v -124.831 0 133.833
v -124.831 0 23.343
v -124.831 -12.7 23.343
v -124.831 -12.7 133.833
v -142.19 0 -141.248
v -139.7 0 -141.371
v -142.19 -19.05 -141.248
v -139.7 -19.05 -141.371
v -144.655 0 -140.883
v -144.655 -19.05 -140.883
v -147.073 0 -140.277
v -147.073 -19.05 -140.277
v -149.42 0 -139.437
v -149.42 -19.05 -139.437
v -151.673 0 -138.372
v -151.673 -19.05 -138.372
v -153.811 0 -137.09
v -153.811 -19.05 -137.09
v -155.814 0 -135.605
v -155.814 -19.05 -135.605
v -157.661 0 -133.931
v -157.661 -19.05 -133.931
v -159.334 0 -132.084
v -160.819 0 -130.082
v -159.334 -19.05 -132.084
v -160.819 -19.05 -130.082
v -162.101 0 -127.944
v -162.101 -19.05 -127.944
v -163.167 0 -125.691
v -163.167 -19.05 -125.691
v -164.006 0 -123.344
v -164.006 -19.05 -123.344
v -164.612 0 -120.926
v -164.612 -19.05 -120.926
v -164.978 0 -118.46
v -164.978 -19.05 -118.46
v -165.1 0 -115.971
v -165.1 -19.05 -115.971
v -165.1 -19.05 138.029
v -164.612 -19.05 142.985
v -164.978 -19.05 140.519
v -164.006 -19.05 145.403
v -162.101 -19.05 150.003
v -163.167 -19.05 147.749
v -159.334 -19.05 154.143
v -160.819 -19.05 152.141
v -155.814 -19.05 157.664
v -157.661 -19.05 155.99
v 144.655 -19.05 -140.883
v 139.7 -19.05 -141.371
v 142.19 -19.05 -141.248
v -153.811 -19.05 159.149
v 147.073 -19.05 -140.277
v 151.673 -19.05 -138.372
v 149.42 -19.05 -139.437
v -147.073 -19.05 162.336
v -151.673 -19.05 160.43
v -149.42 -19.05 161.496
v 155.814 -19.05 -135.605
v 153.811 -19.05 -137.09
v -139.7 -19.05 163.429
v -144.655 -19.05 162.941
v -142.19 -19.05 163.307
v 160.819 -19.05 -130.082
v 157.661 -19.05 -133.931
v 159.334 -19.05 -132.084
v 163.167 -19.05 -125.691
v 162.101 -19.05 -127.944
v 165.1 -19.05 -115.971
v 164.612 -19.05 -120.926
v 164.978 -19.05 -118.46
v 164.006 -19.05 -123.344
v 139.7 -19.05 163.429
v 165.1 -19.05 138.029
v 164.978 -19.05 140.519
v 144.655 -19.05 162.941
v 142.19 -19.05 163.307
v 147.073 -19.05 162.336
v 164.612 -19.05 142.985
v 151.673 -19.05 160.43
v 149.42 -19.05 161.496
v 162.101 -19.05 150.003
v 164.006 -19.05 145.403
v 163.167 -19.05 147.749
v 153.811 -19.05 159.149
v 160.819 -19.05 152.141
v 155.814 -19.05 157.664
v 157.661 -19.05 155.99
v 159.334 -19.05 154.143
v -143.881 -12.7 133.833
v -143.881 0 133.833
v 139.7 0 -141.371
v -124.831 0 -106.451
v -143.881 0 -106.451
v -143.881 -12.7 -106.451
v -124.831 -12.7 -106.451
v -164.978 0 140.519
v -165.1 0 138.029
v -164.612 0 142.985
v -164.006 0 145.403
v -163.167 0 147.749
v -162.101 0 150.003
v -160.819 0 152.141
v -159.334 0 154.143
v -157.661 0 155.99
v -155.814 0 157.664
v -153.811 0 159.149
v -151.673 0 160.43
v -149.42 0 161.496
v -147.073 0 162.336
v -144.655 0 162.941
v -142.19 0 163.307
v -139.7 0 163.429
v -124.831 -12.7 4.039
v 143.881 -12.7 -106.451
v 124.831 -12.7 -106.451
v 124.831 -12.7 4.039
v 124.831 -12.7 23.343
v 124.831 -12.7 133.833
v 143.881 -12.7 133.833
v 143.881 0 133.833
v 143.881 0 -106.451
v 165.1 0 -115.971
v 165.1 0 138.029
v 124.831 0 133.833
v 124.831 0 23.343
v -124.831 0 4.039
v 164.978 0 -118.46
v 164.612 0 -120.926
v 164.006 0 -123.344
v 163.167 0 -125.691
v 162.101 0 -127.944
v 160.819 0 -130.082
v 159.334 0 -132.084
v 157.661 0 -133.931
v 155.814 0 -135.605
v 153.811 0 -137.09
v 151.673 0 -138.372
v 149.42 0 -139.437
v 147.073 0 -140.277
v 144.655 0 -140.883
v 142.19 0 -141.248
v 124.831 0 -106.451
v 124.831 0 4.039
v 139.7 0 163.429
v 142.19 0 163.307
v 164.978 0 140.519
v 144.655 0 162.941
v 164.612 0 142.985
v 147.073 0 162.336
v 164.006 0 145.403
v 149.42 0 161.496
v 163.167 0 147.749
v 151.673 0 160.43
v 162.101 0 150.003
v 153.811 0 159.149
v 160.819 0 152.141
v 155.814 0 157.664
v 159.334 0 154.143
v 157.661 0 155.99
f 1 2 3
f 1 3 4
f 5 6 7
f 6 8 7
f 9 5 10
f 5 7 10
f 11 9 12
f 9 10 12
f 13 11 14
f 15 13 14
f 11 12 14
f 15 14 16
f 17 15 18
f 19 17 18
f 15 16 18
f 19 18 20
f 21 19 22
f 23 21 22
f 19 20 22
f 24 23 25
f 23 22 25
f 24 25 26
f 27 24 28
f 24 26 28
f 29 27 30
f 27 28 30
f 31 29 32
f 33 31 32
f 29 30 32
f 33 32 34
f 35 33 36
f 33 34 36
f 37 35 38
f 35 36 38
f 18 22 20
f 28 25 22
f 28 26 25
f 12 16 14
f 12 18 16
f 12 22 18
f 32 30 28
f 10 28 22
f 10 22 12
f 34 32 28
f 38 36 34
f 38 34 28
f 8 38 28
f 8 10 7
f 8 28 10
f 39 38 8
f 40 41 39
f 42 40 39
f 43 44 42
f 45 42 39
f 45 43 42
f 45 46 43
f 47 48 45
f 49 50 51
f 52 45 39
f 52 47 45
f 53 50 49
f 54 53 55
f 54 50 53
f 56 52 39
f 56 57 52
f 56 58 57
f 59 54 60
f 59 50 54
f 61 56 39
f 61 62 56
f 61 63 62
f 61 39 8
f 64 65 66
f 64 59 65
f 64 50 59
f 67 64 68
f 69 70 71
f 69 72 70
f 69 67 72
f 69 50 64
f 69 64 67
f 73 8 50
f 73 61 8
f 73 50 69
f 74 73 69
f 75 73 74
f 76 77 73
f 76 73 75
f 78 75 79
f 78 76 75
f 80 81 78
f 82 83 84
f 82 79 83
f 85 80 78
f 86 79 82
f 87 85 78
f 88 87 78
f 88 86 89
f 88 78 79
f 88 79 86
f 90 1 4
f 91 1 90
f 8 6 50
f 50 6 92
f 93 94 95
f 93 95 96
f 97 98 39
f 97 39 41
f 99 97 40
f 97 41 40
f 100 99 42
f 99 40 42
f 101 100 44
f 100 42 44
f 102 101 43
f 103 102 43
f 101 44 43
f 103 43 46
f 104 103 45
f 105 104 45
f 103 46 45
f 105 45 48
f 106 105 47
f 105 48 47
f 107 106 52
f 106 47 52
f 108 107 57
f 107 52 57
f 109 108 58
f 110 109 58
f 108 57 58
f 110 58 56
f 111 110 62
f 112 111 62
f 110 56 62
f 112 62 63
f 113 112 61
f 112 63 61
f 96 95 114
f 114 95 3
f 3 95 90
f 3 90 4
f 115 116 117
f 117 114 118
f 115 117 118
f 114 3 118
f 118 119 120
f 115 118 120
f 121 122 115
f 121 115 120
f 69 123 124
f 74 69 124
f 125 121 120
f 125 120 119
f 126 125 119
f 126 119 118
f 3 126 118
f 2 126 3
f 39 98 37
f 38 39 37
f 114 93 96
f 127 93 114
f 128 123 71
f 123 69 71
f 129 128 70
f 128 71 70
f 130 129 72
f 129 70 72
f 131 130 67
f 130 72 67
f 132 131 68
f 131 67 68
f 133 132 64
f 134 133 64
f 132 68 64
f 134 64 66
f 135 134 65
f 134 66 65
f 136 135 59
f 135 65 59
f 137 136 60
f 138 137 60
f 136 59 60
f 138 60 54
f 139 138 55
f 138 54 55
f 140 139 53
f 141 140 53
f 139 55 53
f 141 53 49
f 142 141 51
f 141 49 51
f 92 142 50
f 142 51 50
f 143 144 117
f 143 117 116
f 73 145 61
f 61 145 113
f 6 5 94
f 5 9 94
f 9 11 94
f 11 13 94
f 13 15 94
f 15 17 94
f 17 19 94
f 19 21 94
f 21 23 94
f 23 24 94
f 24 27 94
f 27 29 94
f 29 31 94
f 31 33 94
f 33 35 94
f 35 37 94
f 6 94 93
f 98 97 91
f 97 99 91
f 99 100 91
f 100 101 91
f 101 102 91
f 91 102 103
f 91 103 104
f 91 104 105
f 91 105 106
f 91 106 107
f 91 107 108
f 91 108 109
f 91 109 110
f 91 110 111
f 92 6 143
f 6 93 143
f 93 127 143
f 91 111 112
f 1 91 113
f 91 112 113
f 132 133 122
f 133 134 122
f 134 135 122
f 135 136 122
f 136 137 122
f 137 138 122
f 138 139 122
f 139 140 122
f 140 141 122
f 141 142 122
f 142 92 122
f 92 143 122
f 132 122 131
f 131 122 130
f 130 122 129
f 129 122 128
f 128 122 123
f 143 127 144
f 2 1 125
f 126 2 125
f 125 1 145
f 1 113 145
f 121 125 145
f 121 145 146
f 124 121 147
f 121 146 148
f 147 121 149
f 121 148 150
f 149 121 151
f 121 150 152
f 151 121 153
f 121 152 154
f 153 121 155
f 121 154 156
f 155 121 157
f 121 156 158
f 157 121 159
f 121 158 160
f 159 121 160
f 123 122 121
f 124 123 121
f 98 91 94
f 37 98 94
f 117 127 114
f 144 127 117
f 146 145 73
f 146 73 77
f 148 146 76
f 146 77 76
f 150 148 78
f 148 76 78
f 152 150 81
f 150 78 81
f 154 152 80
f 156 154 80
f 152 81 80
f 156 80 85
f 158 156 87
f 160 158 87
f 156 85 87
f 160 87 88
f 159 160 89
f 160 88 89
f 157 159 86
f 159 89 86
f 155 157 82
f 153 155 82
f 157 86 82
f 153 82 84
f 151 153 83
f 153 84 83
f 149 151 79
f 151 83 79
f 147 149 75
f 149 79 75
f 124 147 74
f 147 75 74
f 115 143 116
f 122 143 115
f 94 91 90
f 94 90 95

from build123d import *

# Parameters (mm, degrees)
F1_DEPTH = 19.05
F3_DEPTH = 12.7
F4_R     = 25.4
F5_R     = 25.4
F6_R     = 25.4
F7_R     = 25.4


with BuildPart() as f1:
    # F0 (on Front) → F1 (new body)
    with BuildSketch(Plane.XZ):
        Polygon((165.1, 163.4293), (0, 163.4293), (-165.1, 163.4293), (-165.1, -141.3707), (165.1, -141.3707), align=None)
    extrude(amount=F1_DEPTH)

    # F2 (on Front) → F3 (cut)
    with BuildSketch(Plane.XZ):
        Polygon((143.880641, -106.450708), (143.880641, 13.691292), (143.880641, 133.833292), (124.830641, 133.833292), (124.830641, 23.343292), (124.830641, 13.691292), (124.830641, 4.039292), (124.830641, -106.450708), align=None)
        Polygon((124.830641, 13.691292), (124.830641, 23.343292), (-124.830641, 23.343292), (-124.830641, 13.691292), (-124.830641, 4.039292), (124.830641, 4.039292), align=None)
        Polygon((-124.830641, 13.691292), (-124.830641, 23.343292), (-124.830641, 133.833292), (-143.880641, 133.833292), (-143.880641, 13.691292), (-143.880641, -106.450708), (-124.830641, -106.450708), (-124.830641, 4.039292), align=None)
    extrude(amount=F3_DEPTH, mode=Mode.SUBTRACT)

    # F4
    f4_edges = [f1.edges().sort_by_distance(p)[0] for p in [
        (165.1, -9.525, 163.4293),
    ]]
    fillet(f4_edges, radius=F4_R)

    # F5
    f5_edges = [f1.edges().sort_by_distance(p)[0] for p in [
        (165.1, -9.525, -141.3707),
    ]]
    fillet(f5_edges, radius=F5_R)

    # F6
    f6_edges = [f1.edges().sort_by_distance(p)[0] for p in [
        (-165.1, -9.525, -141.3707),
    ]]
    fillet(f6_edges, radius=F6_R)

    # F7
    f7_edges = [f1.edges().sort_by_distance(p)[0] for p in [
        (-165.1, -9.525, 163.4293),
    ]]
    fillet(f7_edges, radius=F7_R)


solid = f1.part
